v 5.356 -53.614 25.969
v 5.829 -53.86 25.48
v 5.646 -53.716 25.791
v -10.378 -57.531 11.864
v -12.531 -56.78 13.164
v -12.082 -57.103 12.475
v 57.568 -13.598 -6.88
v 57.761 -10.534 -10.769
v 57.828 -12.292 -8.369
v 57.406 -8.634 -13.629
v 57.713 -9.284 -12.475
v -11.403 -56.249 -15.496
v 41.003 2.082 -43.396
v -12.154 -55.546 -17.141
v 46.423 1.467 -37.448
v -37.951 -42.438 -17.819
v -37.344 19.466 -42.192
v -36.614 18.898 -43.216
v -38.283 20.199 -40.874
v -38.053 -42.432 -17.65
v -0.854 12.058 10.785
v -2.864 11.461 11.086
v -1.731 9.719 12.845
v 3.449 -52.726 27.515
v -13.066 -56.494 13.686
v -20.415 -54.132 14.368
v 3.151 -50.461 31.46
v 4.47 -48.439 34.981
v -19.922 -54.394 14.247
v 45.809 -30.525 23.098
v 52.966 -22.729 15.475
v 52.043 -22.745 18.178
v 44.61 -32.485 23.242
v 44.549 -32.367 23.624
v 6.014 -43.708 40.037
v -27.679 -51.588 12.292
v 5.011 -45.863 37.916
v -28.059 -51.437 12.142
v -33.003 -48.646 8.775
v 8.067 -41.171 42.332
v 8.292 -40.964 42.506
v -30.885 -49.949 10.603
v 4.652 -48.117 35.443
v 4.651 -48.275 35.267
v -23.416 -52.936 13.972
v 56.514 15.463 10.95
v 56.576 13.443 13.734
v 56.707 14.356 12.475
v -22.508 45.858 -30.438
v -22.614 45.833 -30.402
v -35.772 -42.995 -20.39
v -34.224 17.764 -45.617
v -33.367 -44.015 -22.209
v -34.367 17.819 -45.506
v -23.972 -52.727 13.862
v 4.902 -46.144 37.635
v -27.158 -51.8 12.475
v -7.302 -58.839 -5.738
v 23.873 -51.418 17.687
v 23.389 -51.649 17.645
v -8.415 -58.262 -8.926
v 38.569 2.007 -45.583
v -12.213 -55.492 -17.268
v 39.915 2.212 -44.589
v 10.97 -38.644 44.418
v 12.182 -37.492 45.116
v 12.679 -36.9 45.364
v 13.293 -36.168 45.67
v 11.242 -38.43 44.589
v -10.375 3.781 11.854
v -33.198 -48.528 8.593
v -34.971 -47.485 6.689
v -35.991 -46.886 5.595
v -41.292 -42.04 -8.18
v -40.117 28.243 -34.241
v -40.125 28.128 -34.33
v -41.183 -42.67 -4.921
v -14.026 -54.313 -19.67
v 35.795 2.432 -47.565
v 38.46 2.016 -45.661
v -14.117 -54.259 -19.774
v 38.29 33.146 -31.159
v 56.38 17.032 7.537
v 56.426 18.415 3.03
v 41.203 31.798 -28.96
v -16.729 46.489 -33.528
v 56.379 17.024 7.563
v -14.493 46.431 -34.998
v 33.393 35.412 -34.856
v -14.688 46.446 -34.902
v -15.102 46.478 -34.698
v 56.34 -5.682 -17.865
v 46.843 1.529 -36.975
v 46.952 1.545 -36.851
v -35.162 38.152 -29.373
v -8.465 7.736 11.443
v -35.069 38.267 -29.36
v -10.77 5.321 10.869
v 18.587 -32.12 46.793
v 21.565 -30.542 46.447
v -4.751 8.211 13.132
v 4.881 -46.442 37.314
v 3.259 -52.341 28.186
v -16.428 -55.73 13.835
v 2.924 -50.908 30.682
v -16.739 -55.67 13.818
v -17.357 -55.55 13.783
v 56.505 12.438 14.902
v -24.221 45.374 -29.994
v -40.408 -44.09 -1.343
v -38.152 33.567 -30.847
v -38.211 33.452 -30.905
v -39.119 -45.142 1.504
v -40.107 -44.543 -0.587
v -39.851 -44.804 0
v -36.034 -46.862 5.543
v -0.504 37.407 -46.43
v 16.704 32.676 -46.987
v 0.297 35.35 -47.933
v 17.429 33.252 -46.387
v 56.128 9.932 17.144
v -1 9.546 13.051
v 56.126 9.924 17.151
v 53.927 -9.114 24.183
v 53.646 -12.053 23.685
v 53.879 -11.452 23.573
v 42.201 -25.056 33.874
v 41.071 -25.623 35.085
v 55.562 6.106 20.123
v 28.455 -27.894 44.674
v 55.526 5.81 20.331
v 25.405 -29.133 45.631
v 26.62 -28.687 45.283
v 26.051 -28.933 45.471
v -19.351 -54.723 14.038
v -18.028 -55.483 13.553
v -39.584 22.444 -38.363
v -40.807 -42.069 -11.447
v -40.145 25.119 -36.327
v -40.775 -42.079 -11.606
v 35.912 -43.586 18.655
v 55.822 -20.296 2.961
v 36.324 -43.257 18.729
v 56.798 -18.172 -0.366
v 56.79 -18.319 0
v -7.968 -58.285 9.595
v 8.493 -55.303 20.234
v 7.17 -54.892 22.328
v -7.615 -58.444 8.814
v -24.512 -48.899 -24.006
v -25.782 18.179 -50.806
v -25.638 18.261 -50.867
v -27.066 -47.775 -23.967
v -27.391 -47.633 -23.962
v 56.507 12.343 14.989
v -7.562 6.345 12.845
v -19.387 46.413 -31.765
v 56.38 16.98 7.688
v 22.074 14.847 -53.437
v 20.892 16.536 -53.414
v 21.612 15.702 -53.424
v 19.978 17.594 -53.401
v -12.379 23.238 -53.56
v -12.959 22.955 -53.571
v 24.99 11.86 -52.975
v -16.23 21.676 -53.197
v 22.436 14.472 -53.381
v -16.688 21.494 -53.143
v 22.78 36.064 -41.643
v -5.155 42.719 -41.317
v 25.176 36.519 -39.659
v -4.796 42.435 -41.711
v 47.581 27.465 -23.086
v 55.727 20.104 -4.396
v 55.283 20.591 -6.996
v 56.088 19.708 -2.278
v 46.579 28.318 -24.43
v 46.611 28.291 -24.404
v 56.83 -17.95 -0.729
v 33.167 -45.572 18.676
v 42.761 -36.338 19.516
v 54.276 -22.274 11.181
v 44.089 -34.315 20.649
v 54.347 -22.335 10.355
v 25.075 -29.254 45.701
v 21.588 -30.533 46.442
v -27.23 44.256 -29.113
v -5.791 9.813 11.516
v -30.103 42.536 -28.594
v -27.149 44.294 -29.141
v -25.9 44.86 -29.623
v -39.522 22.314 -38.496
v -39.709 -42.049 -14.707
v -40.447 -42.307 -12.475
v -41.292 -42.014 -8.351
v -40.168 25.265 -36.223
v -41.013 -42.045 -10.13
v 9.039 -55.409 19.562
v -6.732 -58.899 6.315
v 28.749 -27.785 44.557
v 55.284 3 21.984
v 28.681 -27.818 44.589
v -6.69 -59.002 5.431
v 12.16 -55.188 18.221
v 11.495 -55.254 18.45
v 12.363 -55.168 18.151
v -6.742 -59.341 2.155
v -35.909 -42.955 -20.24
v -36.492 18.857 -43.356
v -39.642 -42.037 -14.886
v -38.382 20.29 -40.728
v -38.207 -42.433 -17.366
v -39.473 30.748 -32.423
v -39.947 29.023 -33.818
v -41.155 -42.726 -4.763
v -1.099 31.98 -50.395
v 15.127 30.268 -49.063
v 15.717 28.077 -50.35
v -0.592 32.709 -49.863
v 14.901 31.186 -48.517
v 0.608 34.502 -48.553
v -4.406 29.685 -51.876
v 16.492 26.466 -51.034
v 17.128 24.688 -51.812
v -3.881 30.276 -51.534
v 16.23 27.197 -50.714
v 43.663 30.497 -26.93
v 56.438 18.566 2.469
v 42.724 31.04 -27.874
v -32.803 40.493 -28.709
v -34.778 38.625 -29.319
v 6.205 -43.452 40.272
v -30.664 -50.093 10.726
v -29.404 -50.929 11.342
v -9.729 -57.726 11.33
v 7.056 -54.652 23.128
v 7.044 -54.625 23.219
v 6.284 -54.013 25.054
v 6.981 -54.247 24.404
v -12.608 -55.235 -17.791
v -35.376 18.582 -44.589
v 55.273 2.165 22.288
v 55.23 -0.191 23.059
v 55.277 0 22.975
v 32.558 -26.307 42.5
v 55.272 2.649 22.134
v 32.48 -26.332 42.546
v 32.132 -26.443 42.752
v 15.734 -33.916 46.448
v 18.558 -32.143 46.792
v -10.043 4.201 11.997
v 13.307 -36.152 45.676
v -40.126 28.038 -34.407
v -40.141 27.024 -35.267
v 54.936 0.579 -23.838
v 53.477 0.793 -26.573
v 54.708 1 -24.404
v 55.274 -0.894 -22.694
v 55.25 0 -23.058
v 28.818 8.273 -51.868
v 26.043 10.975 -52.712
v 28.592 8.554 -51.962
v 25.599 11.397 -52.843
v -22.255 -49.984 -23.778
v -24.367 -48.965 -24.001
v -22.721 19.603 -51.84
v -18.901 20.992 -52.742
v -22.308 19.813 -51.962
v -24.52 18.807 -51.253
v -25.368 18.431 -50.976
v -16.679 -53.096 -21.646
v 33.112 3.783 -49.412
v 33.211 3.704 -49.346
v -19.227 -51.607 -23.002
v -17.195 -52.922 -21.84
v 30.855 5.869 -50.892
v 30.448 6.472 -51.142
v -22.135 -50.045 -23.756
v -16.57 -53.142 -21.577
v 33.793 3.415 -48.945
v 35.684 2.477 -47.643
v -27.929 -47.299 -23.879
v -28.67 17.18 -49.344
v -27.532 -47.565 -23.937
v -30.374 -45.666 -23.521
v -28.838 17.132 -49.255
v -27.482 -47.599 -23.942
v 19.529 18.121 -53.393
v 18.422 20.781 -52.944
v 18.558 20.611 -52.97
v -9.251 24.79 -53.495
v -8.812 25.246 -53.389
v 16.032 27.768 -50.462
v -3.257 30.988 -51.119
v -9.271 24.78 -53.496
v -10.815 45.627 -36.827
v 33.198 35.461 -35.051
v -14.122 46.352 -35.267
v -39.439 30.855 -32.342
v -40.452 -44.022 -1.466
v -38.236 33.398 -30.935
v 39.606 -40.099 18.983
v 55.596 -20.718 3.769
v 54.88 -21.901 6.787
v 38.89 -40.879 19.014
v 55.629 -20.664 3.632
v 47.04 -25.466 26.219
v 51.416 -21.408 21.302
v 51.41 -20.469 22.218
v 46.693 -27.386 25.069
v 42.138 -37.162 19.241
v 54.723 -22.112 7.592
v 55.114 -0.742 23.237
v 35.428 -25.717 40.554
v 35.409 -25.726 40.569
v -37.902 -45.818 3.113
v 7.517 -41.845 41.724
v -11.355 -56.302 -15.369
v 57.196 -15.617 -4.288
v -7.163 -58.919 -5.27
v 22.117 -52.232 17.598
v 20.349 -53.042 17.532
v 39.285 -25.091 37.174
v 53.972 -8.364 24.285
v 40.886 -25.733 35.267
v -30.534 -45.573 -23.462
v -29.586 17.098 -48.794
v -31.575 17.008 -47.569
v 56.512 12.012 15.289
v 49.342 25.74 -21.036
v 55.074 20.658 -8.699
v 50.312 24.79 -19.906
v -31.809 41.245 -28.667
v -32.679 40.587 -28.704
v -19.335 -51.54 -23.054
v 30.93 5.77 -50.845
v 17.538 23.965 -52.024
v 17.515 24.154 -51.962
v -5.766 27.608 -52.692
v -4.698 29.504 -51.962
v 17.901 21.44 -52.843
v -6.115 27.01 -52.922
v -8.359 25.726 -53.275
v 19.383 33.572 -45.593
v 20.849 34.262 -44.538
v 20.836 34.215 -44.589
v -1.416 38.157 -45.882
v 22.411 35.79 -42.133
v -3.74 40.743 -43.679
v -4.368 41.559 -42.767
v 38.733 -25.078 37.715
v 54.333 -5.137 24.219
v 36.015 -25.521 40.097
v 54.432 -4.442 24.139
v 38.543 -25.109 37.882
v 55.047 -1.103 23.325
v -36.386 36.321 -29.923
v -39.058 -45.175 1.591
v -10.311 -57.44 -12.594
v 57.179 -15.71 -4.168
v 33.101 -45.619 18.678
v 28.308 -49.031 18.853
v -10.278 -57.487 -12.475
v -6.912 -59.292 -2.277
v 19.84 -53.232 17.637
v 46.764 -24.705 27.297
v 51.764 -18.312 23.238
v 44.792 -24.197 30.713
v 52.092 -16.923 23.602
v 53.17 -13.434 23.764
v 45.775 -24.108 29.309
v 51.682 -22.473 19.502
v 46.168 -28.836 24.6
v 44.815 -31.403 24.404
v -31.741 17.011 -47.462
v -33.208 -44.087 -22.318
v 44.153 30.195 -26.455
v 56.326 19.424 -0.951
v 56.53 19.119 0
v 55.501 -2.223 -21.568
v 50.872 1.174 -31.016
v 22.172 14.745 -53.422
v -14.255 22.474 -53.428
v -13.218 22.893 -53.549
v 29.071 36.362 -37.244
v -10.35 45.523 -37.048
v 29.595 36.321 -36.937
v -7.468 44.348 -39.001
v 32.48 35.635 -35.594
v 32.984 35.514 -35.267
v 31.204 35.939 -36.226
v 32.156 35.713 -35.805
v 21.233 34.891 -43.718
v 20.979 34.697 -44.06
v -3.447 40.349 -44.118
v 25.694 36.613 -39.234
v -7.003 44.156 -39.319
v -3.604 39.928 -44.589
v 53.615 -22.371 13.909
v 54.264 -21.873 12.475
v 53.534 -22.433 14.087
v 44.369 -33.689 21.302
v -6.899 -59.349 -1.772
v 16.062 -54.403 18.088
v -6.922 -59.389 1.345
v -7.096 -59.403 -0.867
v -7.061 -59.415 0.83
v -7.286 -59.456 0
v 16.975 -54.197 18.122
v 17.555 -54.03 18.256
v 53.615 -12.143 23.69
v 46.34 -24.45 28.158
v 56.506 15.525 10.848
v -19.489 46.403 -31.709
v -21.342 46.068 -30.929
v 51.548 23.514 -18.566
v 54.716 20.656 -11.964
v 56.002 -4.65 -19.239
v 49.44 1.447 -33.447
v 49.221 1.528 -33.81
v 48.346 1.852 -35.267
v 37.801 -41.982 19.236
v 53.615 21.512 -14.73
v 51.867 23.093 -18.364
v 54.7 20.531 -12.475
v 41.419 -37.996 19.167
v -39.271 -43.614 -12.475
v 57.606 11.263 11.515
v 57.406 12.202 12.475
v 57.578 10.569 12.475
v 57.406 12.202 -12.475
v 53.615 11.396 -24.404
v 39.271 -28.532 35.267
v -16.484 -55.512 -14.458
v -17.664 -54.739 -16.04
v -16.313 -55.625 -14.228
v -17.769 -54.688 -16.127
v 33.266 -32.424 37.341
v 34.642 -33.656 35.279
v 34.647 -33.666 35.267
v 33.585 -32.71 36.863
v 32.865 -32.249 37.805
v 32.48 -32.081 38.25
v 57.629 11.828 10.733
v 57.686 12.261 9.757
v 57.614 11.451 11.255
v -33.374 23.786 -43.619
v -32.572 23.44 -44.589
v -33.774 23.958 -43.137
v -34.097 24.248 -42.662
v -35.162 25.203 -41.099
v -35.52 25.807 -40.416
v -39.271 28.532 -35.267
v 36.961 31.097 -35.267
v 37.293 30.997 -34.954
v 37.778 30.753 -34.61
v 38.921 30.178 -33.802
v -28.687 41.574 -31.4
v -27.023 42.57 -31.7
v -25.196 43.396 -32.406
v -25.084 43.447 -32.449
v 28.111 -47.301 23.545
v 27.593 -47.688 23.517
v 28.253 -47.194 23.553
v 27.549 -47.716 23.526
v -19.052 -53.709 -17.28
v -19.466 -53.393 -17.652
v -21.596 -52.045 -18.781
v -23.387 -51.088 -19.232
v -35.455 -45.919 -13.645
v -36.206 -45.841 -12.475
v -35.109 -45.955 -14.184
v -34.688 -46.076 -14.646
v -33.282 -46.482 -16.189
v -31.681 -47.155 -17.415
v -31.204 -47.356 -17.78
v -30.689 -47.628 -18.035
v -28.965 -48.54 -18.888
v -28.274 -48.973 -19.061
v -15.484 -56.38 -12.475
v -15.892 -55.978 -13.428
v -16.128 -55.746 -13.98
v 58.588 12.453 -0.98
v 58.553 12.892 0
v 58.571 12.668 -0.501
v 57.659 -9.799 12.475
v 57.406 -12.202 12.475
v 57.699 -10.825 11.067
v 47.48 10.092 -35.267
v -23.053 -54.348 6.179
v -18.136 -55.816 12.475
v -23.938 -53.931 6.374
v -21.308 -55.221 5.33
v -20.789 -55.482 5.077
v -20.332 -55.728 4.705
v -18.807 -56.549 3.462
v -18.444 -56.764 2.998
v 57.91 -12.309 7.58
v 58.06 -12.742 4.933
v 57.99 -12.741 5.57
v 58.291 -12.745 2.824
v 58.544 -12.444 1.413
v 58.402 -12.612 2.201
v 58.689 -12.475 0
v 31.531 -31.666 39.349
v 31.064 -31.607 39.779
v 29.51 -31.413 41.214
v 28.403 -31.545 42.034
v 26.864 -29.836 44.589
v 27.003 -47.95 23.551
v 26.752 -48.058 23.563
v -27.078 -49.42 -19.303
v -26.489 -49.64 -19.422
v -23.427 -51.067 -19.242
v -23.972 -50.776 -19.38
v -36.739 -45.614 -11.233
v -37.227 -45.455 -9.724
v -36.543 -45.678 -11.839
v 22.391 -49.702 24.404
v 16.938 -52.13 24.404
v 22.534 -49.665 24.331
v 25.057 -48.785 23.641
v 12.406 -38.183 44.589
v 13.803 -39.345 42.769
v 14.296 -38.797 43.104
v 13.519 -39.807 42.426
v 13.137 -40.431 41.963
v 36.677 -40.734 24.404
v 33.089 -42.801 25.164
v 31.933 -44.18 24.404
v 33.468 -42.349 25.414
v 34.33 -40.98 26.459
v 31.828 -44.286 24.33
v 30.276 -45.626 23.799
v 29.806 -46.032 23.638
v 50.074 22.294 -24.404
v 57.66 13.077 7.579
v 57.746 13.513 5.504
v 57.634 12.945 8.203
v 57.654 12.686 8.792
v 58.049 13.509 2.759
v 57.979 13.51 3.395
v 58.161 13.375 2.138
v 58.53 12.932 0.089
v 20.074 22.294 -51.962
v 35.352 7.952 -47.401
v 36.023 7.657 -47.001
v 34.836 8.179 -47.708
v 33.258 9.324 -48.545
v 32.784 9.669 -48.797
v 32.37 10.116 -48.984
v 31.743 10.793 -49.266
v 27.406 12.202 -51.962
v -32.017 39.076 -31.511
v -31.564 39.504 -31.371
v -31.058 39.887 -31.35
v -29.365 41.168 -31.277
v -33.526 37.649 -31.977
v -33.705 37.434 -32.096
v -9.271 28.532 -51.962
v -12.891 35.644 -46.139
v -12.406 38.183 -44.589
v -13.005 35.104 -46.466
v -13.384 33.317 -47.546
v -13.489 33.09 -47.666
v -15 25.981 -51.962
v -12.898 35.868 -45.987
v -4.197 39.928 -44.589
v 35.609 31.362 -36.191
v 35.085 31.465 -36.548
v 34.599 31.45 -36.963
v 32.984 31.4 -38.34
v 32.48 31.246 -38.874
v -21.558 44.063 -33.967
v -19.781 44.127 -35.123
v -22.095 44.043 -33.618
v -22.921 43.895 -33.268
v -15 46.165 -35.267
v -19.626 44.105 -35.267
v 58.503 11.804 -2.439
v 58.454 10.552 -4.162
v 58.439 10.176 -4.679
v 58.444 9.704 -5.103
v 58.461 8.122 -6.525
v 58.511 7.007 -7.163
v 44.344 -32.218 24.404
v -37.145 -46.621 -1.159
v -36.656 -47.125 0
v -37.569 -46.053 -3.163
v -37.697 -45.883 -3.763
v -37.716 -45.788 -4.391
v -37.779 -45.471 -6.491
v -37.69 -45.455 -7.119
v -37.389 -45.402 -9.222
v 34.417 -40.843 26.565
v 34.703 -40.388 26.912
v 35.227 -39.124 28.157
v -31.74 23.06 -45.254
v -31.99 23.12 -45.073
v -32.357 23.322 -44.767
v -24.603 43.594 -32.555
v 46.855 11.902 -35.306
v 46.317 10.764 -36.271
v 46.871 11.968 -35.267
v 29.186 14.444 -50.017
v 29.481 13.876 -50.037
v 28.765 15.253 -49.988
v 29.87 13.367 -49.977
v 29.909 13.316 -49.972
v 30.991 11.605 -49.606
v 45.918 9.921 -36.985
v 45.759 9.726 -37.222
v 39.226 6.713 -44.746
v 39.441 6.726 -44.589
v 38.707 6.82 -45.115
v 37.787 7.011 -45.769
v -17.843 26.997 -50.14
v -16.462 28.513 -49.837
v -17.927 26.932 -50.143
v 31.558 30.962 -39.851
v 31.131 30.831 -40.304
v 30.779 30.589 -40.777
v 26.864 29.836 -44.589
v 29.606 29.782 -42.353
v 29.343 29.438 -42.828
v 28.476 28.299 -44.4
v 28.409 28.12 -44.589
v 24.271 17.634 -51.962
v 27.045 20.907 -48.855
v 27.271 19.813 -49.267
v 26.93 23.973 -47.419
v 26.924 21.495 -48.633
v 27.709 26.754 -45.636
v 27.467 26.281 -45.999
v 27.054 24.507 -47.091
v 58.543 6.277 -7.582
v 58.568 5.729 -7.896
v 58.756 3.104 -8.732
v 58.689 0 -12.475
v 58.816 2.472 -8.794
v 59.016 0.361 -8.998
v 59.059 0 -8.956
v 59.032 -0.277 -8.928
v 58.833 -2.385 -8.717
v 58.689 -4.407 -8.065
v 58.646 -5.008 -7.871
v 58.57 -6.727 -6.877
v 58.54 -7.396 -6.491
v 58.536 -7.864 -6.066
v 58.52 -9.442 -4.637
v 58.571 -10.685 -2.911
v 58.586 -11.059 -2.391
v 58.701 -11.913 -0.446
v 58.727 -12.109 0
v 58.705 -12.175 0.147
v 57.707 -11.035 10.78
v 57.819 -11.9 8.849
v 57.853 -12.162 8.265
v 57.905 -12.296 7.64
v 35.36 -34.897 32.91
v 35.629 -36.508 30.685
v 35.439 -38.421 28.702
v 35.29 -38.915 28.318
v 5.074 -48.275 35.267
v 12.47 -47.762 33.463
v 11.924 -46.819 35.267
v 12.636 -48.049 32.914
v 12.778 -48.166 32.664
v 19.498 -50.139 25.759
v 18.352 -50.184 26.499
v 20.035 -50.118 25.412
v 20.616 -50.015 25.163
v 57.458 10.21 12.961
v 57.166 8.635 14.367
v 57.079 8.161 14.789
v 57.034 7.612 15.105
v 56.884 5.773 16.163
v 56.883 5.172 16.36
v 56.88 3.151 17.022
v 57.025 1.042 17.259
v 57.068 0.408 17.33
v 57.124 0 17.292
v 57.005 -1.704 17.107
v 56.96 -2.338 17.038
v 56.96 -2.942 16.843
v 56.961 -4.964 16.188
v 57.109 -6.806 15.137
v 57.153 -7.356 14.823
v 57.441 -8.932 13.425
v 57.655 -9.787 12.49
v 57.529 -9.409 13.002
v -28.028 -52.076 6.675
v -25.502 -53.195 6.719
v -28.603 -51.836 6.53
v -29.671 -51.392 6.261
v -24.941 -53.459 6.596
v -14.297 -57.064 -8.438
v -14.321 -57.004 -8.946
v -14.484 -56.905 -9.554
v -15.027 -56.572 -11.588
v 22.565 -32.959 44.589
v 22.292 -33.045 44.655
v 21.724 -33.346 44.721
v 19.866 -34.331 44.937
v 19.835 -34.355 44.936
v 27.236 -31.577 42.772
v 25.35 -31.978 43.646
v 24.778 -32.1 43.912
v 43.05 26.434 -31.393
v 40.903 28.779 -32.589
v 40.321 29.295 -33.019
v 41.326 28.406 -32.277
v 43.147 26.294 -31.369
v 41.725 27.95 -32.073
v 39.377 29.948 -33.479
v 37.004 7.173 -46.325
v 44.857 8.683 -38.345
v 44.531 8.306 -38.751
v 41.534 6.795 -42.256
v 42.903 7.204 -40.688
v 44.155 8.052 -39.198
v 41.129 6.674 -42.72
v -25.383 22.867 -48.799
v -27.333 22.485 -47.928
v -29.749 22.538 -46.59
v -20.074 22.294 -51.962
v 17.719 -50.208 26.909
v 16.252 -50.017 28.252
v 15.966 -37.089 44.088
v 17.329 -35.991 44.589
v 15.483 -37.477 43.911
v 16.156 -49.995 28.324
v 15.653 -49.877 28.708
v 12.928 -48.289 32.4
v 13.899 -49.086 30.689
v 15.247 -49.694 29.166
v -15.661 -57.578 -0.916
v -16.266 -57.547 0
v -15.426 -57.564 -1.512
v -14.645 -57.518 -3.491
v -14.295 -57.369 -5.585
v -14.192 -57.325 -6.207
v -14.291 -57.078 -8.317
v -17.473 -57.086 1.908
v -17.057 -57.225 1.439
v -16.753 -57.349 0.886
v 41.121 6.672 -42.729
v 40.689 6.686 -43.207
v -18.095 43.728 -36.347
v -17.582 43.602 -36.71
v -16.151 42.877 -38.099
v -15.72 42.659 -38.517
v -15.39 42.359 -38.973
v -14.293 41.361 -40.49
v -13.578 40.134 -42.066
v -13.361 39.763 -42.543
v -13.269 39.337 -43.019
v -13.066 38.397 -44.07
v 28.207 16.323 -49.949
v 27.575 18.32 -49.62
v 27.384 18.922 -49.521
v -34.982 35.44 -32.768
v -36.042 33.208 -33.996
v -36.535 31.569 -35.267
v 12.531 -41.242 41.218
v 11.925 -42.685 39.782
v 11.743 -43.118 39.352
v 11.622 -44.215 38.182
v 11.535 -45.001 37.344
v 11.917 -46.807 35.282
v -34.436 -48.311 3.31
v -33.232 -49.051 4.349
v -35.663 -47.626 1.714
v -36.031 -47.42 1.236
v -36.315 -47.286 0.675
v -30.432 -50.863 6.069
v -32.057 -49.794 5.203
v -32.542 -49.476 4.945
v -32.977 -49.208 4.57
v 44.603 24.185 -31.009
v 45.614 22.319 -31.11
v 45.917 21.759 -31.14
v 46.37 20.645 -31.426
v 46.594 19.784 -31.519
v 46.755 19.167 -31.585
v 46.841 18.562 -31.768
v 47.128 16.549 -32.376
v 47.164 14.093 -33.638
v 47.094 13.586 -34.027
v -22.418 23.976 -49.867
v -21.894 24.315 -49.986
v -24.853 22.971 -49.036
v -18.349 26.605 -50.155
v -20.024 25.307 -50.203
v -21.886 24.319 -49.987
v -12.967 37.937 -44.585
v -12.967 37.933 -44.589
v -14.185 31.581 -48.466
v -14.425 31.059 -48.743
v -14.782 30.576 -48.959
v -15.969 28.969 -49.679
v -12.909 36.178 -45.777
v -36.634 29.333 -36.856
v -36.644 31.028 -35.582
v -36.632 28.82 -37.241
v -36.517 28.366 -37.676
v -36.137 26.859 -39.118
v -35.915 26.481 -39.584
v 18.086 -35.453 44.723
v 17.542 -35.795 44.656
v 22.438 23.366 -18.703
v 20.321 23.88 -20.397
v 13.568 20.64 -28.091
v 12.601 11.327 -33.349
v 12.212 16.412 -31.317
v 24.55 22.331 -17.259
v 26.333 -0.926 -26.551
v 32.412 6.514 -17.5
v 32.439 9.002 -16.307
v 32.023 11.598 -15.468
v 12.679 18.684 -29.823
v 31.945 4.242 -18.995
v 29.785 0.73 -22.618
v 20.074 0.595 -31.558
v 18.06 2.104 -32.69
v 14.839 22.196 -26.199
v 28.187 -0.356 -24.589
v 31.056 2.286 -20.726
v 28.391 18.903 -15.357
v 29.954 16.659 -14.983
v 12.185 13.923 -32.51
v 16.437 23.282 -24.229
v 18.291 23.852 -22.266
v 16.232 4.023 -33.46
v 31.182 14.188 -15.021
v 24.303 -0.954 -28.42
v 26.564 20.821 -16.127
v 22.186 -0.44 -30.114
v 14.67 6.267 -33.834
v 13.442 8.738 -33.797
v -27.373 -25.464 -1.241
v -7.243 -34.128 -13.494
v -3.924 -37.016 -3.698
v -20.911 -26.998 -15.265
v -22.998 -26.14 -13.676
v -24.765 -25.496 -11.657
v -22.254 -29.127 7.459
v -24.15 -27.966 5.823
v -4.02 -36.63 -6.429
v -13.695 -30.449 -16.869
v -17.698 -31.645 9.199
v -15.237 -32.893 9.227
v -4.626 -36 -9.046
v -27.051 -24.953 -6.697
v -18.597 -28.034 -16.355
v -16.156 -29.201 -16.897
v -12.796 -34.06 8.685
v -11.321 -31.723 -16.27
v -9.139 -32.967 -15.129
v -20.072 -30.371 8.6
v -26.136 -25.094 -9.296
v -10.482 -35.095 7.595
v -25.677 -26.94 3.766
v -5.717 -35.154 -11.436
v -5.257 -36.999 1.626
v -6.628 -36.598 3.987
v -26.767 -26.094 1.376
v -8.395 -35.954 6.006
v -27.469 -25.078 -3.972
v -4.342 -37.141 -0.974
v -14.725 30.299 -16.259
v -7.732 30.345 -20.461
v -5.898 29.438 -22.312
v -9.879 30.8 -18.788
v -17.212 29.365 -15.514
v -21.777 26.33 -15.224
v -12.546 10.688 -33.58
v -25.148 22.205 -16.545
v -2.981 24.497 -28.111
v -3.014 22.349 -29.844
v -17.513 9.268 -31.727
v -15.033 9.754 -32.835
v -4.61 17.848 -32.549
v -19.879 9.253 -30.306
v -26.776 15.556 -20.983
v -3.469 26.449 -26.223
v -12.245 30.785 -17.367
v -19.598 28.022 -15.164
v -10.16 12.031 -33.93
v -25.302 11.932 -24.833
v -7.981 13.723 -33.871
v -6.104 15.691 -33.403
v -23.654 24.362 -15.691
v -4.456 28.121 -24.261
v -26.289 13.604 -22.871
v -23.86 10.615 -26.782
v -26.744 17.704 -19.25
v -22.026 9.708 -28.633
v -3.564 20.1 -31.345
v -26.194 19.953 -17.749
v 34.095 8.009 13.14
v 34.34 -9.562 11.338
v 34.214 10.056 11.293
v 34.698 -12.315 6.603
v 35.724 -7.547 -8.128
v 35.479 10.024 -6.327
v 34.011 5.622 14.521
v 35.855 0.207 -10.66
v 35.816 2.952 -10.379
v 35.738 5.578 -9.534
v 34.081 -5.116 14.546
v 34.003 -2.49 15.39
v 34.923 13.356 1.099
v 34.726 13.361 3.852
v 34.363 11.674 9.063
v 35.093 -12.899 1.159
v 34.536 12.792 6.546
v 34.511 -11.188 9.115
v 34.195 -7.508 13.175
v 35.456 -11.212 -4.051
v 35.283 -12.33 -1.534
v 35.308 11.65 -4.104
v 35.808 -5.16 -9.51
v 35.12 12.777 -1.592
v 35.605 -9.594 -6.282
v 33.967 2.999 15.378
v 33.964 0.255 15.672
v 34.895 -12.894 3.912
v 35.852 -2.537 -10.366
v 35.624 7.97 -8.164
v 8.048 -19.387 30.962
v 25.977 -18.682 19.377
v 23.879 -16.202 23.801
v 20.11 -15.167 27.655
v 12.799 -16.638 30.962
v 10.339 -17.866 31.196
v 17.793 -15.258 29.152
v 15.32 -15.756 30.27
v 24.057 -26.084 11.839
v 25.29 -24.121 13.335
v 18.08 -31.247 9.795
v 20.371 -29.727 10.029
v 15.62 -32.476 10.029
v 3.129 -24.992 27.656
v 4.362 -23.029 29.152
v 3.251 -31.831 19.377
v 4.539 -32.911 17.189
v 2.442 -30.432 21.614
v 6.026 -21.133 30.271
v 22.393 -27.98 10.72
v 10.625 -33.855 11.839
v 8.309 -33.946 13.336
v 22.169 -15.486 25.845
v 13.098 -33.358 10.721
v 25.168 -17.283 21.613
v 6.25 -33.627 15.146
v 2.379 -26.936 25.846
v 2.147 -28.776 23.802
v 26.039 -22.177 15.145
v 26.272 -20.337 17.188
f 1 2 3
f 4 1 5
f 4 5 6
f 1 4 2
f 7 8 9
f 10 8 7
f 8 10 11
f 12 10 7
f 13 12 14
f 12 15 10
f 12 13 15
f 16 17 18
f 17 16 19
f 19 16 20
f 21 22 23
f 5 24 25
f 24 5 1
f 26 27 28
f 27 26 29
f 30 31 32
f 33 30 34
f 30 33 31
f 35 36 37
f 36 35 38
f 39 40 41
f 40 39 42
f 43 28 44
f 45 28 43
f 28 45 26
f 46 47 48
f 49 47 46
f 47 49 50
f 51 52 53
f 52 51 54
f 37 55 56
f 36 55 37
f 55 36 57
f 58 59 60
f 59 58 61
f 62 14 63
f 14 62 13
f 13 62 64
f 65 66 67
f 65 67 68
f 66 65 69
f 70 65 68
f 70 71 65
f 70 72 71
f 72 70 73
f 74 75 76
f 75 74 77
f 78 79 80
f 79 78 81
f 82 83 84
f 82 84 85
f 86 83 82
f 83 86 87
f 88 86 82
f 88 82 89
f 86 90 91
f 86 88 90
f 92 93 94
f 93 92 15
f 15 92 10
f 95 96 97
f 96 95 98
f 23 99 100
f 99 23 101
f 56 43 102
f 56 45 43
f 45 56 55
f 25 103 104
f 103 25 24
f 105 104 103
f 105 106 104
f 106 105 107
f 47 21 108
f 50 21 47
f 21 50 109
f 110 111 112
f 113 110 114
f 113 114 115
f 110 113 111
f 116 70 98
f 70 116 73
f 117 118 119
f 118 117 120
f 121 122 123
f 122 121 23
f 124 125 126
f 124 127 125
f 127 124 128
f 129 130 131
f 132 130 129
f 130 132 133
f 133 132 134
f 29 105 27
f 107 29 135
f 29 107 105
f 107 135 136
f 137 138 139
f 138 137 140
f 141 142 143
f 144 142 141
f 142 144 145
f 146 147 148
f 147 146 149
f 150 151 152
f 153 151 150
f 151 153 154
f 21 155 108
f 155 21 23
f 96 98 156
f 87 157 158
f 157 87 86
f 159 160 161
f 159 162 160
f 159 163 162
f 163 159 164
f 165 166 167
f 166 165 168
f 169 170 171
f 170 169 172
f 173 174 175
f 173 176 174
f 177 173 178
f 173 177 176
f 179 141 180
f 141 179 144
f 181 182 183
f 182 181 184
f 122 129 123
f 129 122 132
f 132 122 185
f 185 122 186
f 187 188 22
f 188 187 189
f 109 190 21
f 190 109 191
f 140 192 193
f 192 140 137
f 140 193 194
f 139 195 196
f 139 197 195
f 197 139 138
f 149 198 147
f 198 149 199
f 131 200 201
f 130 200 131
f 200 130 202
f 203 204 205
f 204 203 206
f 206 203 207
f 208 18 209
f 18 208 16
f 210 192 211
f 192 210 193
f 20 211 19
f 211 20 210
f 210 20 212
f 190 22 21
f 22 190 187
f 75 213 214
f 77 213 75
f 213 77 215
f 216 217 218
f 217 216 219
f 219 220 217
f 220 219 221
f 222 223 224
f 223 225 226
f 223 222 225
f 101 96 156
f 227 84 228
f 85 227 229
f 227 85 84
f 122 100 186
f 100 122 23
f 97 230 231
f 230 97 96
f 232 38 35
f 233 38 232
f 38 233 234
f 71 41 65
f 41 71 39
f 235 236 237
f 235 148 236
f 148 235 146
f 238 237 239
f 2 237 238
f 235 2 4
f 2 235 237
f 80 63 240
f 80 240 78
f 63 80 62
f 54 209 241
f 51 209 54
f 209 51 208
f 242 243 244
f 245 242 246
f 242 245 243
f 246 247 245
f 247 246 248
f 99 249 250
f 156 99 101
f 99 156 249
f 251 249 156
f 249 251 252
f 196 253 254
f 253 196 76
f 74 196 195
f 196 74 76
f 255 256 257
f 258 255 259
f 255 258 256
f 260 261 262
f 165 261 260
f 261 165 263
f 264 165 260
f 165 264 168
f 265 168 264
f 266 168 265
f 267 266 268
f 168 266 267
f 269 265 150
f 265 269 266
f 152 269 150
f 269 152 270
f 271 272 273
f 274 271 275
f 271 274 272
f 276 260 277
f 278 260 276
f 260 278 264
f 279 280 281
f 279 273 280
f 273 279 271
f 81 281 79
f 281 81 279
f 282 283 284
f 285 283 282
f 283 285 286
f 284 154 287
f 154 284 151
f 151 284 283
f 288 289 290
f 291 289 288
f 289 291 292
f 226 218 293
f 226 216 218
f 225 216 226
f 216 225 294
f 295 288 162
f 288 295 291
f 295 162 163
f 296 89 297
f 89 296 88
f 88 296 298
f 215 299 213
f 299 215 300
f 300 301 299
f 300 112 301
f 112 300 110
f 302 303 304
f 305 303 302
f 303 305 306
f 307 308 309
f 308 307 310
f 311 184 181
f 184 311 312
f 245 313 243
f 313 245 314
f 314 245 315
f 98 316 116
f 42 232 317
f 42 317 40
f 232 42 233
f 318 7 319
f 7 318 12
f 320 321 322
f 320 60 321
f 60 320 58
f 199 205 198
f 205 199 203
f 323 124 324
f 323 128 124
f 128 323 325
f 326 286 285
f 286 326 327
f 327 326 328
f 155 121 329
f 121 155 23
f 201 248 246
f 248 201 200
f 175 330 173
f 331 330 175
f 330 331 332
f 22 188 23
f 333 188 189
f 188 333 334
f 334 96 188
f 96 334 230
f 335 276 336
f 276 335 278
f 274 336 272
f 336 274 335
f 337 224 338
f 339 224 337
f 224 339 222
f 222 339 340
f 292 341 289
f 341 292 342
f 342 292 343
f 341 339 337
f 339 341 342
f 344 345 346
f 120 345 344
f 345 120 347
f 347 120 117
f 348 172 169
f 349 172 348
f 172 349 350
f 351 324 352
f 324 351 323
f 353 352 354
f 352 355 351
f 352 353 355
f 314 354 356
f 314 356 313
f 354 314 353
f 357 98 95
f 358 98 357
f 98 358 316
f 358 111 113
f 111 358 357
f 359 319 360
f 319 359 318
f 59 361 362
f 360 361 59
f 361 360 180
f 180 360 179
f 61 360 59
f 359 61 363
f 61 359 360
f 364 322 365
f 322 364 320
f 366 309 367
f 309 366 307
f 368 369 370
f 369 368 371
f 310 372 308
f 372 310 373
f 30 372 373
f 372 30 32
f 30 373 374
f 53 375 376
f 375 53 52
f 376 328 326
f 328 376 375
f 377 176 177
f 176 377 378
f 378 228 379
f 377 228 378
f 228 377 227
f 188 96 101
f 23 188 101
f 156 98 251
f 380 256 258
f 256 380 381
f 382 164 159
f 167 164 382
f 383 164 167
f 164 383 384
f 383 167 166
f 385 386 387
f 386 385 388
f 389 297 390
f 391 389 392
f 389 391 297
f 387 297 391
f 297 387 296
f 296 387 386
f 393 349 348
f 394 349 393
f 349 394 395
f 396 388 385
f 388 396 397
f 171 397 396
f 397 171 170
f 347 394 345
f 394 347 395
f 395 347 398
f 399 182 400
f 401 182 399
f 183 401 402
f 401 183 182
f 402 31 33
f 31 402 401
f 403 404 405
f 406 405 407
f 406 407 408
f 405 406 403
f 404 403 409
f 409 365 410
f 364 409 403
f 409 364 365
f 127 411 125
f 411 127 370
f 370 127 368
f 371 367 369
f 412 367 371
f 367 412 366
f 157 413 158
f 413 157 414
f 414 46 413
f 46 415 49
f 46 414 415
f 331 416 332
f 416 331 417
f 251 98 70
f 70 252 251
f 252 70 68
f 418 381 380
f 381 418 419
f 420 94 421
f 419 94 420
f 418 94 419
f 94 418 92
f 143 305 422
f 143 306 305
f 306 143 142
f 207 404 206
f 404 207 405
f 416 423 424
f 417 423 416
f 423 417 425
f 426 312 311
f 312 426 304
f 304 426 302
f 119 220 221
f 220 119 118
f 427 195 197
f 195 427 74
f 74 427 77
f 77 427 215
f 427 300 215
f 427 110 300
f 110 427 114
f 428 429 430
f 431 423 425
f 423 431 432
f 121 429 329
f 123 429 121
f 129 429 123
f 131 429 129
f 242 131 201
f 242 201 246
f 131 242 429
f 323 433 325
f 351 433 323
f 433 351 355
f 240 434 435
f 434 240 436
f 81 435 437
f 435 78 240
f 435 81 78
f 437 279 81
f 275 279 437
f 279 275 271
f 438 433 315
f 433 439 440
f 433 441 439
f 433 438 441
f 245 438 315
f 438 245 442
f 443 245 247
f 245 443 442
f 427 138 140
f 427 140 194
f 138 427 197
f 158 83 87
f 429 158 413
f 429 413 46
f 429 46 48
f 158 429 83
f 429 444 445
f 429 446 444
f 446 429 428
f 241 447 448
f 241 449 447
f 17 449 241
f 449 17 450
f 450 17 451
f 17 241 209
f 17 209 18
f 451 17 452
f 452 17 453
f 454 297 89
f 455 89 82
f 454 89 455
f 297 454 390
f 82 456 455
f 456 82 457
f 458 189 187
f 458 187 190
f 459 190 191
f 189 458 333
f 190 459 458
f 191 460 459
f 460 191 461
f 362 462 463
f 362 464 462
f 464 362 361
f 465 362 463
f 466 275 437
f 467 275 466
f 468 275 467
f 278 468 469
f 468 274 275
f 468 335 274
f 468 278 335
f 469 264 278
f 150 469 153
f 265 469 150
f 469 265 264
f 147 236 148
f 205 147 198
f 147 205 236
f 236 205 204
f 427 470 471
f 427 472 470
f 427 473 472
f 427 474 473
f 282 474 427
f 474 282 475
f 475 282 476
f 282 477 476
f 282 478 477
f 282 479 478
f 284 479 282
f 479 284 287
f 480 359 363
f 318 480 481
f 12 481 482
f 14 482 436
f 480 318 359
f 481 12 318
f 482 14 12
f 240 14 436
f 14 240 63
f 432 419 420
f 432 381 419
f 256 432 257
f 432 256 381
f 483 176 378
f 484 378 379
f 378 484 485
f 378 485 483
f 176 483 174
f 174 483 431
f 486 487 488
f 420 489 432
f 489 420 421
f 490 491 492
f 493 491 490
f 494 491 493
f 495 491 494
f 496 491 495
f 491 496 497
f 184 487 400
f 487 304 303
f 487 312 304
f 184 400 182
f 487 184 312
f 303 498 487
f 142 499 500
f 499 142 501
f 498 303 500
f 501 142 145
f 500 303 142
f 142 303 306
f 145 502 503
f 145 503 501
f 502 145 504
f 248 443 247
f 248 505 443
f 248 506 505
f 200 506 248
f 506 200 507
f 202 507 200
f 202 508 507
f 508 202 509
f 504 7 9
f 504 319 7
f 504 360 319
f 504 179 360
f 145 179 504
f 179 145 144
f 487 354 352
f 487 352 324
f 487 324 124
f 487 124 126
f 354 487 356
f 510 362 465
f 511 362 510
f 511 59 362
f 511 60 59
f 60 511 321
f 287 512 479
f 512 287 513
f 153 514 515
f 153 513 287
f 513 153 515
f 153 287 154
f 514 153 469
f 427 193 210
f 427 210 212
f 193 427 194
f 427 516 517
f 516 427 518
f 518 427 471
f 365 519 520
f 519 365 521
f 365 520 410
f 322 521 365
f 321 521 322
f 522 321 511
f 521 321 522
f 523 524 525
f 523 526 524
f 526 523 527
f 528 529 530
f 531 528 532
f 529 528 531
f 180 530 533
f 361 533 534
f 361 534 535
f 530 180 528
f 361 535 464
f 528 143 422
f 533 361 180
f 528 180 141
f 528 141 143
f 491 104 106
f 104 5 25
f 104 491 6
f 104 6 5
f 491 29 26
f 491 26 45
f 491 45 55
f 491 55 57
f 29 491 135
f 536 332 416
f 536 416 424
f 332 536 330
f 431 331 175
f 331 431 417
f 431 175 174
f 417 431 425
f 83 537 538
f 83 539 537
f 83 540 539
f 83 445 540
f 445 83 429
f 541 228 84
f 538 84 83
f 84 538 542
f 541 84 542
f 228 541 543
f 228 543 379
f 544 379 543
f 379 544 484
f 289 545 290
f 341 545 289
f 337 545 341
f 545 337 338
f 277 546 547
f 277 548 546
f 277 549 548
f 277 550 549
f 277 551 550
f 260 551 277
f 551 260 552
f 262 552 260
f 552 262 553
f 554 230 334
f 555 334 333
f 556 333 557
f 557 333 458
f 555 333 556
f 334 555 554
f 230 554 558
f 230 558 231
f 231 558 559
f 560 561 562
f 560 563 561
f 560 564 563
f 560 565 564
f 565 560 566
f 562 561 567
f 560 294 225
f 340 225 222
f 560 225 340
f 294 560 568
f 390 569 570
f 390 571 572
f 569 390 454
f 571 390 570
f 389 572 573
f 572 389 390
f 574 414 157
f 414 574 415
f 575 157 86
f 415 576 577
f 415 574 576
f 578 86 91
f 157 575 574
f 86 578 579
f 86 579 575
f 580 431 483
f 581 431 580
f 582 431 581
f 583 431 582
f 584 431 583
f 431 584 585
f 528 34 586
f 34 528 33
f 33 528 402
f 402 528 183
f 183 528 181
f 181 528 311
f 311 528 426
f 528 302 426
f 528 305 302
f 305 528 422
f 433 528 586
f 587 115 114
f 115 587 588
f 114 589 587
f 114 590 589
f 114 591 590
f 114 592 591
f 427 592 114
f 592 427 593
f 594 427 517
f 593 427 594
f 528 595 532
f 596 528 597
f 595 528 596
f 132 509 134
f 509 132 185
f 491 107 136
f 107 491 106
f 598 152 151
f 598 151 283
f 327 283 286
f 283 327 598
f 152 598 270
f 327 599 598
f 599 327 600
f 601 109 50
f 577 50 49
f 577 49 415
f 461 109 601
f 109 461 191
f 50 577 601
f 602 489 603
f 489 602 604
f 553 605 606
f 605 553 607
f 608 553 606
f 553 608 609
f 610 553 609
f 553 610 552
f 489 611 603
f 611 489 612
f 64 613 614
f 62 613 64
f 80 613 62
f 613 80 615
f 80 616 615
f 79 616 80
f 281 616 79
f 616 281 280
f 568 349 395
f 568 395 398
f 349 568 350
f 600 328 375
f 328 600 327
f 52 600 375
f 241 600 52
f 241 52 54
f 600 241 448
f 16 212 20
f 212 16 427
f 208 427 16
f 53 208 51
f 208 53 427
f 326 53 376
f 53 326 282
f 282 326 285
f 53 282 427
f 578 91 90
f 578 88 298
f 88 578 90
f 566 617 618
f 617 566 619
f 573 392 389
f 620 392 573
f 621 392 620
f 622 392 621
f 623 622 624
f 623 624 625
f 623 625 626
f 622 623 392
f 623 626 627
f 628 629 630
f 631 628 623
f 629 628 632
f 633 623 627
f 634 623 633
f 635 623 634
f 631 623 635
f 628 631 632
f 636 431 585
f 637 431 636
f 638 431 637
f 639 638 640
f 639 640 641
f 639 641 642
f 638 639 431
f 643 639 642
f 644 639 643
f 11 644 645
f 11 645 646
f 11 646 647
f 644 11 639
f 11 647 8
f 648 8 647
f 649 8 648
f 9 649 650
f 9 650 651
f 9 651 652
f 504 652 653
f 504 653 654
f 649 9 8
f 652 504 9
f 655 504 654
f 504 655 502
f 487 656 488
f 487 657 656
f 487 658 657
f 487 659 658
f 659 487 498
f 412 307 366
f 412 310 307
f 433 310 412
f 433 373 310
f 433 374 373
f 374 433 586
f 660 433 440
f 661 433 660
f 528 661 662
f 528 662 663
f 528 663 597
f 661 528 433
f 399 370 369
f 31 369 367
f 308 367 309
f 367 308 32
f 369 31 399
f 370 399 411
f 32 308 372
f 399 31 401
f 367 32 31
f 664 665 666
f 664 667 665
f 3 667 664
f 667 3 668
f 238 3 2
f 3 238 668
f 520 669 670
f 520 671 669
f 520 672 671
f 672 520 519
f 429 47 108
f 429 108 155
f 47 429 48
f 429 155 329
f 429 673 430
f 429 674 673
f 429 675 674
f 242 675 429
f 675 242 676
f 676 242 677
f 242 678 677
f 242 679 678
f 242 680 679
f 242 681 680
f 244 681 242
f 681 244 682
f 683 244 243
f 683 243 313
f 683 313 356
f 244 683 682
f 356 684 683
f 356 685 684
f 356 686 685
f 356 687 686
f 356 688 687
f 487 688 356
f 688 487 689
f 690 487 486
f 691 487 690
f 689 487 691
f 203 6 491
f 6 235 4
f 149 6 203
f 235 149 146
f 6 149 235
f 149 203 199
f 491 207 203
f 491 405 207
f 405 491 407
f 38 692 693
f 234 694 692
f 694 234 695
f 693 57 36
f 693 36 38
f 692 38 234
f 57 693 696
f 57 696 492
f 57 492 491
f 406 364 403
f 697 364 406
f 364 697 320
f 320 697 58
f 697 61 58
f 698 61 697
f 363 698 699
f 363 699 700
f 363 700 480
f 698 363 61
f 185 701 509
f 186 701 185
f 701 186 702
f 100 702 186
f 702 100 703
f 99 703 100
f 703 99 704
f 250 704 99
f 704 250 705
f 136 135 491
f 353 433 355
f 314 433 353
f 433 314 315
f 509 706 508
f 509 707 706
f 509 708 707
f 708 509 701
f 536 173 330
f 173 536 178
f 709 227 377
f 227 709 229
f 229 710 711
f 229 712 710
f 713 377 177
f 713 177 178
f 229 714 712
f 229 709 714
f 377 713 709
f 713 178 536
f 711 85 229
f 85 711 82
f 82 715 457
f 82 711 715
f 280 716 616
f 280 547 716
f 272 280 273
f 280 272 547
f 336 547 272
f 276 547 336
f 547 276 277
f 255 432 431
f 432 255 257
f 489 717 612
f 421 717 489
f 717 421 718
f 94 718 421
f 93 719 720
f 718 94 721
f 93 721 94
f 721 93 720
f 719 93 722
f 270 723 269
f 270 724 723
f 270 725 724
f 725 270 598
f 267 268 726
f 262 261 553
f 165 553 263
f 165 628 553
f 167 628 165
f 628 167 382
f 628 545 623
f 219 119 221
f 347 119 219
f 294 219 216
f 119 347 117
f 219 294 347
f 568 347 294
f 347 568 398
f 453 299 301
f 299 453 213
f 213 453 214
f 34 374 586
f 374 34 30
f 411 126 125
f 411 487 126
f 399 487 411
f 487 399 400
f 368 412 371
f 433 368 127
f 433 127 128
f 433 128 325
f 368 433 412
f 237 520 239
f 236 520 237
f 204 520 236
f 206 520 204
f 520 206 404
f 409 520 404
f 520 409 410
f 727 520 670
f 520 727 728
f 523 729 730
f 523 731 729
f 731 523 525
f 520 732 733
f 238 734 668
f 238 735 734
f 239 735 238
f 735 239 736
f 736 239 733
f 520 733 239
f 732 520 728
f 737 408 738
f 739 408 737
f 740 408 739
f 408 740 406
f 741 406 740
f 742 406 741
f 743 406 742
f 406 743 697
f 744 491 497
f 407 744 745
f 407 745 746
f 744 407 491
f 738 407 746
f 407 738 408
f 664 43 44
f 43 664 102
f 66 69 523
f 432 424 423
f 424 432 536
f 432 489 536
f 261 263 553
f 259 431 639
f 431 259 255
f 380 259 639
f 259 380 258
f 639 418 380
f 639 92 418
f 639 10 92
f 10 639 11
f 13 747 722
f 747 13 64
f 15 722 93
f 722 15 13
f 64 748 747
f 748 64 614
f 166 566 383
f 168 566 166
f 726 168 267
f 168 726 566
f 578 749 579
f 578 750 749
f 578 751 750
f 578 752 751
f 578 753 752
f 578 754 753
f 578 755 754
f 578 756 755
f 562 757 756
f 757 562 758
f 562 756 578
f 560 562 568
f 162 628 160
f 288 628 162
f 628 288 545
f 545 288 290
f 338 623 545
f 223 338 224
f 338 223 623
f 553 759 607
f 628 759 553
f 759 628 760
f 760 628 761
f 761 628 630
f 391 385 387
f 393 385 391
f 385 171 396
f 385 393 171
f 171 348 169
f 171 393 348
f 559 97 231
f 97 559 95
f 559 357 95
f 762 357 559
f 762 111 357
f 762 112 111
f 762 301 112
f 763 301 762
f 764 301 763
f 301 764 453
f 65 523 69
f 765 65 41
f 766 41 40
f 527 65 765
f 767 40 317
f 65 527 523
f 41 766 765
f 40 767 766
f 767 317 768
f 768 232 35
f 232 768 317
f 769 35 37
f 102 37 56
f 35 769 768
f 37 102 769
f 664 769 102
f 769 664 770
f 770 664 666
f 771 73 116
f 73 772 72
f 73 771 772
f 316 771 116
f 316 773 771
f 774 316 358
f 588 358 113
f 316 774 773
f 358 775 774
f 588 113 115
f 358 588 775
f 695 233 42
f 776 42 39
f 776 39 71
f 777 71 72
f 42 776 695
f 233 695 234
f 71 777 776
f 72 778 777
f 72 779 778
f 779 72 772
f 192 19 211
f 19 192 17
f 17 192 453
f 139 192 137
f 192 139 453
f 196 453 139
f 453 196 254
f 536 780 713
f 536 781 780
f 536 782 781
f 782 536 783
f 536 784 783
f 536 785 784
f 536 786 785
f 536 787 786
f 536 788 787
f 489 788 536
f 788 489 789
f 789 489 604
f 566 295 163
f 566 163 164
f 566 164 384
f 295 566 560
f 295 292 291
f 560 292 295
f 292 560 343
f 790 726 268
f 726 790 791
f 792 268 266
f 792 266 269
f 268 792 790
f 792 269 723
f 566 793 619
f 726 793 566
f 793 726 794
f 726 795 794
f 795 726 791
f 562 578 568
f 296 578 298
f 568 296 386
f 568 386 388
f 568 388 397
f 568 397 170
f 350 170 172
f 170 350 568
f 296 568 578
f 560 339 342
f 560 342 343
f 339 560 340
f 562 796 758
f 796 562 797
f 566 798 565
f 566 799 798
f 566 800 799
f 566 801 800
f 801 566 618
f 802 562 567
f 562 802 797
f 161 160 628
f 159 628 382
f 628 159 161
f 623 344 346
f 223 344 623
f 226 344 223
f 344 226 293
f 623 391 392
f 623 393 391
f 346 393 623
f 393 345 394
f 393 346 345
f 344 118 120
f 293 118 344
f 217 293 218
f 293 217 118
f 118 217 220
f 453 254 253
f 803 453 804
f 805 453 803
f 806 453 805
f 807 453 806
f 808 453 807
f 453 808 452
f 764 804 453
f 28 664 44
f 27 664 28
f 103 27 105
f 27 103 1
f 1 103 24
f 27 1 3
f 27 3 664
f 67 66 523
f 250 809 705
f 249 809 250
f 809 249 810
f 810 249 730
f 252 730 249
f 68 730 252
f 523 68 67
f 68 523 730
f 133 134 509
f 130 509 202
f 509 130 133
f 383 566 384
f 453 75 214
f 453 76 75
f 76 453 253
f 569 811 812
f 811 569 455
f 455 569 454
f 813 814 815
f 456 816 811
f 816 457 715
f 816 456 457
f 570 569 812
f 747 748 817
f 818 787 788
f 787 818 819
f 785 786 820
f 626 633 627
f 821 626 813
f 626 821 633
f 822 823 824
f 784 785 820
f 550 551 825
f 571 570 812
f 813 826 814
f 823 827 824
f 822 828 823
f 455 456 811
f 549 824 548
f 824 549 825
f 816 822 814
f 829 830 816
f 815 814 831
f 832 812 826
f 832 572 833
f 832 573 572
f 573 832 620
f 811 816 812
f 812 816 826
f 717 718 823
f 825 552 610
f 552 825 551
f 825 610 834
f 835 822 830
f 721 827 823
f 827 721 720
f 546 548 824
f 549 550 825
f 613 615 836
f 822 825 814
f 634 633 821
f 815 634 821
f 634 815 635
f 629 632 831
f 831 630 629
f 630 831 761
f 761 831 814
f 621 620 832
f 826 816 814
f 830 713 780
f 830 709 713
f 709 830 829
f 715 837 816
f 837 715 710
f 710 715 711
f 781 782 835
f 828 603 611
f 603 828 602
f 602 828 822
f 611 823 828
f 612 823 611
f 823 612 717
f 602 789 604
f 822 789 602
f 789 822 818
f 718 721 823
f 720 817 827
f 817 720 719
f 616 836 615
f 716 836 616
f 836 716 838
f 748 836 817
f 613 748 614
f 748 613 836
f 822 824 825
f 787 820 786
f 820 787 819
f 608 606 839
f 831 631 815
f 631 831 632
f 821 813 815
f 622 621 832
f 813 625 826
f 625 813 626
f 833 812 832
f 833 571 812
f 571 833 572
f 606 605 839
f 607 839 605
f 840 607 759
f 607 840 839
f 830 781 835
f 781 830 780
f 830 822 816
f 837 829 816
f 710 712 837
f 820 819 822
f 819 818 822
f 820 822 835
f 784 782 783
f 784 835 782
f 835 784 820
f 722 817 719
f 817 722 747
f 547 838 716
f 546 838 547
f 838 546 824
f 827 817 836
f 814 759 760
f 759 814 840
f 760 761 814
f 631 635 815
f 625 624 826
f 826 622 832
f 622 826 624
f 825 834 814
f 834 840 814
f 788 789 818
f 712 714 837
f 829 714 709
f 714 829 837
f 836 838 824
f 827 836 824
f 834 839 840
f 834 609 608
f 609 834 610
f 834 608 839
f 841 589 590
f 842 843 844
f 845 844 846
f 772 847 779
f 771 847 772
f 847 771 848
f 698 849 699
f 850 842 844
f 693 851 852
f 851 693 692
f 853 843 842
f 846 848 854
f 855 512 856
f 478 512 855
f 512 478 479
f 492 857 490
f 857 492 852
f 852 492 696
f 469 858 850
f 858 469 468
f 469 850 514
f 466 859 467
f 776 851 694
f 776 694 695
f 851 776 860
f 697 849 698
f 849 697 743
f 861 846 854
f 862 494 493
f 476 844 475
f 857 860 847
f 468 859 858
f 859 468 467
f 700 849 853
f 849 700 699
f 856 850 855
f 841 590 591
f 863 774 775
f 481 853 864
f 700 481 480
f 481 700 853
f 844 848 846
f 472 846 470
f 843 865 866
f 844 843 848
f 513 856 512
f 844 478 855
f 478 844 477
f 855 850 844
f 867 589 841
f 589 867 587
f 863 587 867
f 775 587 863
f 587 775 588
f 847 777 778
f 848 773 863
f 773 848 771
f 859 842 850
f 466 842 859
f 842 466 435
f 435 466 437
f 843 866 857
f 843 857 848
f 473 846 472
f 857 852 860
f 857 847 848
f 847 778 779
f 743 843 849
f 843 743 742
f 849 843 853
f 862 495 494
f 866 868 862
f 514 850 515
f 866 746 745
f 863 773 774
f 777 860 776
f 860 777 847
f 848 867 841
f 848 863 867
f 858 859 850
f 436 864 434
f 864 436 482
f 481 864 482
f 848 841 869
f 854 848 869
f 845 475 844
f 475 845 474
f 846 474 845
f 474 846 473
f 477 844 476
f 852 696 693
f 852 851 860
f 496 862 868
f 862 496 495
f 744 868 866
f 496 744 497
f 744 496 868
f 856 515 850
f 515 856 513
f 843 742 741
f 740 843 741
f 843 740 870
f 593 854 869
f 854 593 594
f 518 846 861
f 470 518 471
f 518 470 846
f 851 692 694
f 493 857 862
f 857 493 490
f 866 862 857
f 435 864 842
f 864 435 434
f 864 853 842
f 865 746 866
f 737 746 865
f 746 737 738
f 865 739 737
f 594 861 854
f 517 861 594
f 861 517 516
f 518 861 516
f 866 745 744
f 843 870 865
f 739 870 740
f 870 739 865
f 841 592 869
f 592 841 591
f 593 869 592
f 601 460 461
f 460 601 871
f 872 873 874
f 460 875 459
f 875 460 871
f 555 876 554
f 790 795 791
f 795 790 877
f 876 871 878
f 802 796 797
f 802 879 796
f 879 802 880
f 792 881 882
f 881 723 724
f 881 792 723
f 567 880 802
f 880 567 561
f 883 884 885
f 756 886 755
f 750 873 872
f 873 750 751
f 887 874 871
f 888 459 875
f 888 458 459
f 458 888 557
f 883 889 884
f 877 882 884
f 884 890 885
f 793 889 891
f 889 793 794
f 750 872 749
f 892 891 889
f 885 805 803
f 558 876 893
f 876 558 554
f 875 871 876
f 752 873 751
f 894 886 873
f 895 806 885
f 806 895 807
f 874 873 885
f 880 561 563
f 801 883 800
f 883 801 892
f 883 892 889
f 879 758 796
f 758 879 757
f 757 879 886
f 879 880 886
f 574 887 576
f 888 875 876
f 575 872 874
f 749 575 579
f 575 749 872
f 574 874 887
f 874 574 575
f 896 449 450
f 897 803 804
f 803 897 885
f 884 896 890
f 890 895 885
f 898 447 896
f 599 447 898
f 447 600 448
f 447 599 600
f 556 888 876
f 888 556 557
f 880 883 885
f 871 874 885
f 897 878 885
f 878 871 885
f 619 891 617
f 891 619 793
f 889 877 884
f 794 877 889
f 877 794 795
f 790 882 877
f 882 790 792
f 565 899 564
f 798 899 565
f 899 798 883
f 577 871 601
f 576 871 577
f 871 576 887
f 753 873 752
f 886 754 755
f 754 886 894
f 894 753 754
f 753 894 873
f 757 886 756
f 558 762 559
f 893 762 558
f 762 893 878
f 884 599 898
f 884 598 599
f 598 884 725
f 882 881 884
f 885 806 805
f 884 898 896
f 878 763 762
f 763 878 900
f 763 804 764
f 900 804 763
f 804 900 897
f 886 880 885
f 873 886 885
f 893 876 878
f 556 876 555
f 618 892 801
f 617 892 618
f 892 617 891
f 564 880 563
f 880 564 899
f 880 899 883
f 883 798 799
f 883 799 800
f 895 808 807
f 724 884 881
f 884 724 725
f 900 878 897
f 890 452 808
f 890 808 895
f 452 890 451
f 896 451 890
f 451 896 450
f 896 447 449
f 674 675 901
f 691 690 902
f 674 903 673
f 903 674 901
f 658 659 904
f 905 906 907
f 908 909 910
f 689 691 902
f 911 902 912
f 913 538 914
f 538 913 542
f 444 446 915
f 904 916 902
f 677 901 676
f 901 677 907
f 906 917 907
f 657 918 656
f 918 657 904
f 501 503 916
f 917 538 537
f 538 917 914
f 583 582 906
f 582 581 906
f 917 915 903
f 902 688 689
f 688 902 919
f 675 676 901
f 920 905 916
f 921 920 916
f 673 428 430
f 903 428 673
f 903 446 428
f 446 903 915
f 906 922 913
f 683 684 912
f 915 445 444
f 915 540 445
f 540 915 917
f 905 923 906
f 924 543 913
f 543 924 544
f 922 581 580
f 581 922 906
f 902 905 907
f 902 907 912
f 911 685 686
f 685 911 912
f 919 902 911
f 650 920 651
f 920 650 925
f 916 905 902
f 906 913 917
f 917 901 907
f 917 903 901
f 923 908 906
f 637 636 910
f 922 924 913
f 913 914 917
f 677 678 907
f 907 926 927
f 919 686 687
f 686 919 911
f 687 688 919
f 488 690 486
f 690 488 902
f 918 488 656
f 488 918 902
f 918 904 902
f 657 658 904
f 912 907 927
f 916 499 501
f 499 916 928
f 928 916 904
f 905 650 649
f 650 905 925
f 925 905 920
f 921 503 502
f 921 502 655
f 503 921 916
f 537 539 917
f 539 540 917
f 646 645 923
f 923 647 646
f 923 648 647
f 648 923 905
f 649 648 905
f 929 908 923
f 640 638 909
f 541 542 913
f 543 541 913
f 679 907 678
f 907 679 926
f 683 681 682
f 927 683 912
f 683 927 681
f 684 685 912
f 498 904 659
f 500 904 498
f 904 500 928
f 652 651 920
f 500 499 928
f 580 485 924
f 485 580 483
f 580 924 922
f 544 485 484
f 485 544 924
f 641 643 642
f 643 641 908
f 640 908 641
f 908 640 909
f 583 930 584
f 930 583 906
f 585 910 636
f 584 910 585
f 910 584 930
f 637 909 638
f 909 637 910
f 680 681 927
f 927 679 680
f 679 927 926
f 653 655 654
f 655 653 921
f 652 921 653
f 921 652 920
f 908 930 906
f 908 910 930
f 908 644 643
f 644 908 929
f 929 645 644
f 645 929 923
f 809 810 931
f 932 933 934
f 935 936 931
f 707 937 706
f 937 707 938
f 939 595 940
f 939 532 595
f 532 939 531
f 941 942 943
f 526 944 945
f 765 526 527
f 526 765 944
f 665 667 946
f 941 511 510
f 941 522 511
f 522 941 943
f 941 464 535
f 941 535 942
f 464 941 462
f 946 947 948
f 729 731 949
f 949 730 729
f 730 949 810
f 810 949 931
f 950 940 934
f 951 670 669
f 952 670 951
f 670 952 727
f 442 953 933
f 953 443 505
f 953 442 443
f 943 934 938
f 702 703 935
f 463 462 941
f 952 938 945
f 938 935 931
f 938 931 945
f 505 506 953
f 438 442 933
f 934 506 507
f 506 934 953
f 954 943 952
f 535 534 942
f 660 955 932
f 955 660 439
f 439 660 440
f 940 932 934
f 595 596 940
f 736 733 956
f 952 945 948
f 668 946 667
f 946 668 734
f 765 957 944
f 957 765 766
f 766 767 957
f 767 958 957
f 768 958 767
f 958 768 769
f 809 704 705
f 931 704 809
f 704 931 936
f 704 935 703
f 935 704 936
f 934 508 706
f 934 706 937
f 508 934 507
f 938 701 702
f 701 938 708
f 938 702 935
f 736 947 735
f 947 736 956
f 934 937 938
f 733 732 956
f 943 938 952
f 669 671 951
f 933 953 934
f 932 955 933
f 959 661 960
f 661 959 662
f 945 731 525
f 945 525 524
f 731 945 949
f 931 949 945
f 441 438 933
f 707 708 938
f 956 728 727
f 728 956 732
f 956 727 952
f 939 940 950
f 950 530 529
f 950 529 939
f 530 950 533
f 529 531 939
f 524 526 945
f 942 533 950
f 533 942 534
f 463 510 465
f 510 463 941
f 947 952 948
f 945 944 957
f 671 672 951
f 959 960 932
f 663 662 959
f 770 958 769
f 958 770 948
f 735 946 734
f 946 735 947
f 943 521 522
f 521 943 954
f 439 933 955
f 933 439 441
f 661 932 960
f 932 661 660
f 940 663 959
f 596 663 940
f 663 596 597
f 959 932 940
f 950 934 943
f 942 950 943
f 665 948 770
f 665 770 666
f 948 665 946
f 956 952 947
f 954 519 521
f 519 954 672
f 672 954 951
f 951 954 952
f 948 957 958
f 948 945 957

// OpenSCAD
difference() {
	intersection() {
		hull() {
			rotate(a = -118.9051365199, v = [0.4418015166, 0.7557603411, -0.0000000000]) {
				rotate(a = -90.0000000000, v = [0.9238795325, 0.3826834324, -0.0000000000]) {
					cylinder(h = 60, r = 16.2000000000);
				}
			}
			rotate(a = -118.9051365199, v = [0.4418015166, 0.7557603411, -0.0000000000]) {
				rotate(a = -90.0000000000, v = [-0.7933533403, 0.6087614290, 0.0000000000]) {
					cylinder(h = 60, r = 16.2000000000);
				}
			}
			rotate(a = -118.9051365199, v = [0.4418015166, 0.7557603411, -0.0000000000]) {
				rotate(a = -24.0657434263, v = [0.3911208660, 0.1153809290, -0.0000000000]) {
					cylinder(h = 60, r = 16.2000000000);
				}
			}
			rotate(a = -118.9051365199, v = [0.4418015166, 0.7557603411, -0.0000000000]) {
				rotate(a = -141.7661142776, v = [0.6170926551, 0.0469096494, -0.0000000000]) {
					cylinder(h = 60, r = 16.2000000000);
				}
			}
			rotate(a = -118.9051365199, v = [0.4418015166, 0.7557603411, -0.0000000000]) {
				rotate(a = -154.1384175201, v = [-0.4328755604, 0.0537392134, 0.0000000000]) {
					cylinder(h = 60, r = 16.2000000000);
				}
			}
		}
		sphere(r = 60);
	}
	union() {
		rotate(a = -118.9051365199, v = [0.4418015166, 0.7557603411, -0.0000000000]) {
			rotate(a = -90.0000000000, v = [0.9238795325, 0.3826834324, -0.0000000000]) {
				translate(v = [0, 0, 35]) {
					cylinder(h = 100, r = 13.2000000000);
				}
			}
		}
		rotate(a = -118.9051365199, v = [0.4418015166, 0.7557603411, -0.0000000000]) {
			rotate(a = -90.0000000000, v = [-0.7933533403, 0.6087614290, 0.0000000000]) {
				translate(v = [0, 0, 35]) {
					cylinder(h = 100, r = 13.2000000000);
				}
			}
		}
		rotate(a = -118.9051365199, v = [0.4418015166, 0.7557603411, -0.0000000000]) {
			rotate(a = -24.0657434263, v = [0.3911208660, 0.1153809290, -0.0000000000]) {
				translate(v = [0, 0, 35]) {
					cylinder(h = 100, r = 13.2000000000);
				}
			}
		}
		rotate(a = -118.9051365199, v = [0.4418015166, 0.7557603411, -0.0000000000]) {
			rotate(a = -141.7661142776, v = [0.6170926551, 0.0469096494, -0.0000000000]) {
				translate(v = [0, 0, 35]) {
					cylinder(h = 100, r = 13.2000000000);
				}
			}
		}
		rotate(a = -118.9051365199, v = [0.4418015166, 0.7557603411, -0.0000000000]) {
			rotate(a = -154.1384175201, v = [-0.4328755604, 0.0537392134, 0.0000000000]) {
				translate(v = [0, 0, 35]) {
					cylinder(h = 100, r = 13.2000000000);
				}
			}
		}
	}
}
